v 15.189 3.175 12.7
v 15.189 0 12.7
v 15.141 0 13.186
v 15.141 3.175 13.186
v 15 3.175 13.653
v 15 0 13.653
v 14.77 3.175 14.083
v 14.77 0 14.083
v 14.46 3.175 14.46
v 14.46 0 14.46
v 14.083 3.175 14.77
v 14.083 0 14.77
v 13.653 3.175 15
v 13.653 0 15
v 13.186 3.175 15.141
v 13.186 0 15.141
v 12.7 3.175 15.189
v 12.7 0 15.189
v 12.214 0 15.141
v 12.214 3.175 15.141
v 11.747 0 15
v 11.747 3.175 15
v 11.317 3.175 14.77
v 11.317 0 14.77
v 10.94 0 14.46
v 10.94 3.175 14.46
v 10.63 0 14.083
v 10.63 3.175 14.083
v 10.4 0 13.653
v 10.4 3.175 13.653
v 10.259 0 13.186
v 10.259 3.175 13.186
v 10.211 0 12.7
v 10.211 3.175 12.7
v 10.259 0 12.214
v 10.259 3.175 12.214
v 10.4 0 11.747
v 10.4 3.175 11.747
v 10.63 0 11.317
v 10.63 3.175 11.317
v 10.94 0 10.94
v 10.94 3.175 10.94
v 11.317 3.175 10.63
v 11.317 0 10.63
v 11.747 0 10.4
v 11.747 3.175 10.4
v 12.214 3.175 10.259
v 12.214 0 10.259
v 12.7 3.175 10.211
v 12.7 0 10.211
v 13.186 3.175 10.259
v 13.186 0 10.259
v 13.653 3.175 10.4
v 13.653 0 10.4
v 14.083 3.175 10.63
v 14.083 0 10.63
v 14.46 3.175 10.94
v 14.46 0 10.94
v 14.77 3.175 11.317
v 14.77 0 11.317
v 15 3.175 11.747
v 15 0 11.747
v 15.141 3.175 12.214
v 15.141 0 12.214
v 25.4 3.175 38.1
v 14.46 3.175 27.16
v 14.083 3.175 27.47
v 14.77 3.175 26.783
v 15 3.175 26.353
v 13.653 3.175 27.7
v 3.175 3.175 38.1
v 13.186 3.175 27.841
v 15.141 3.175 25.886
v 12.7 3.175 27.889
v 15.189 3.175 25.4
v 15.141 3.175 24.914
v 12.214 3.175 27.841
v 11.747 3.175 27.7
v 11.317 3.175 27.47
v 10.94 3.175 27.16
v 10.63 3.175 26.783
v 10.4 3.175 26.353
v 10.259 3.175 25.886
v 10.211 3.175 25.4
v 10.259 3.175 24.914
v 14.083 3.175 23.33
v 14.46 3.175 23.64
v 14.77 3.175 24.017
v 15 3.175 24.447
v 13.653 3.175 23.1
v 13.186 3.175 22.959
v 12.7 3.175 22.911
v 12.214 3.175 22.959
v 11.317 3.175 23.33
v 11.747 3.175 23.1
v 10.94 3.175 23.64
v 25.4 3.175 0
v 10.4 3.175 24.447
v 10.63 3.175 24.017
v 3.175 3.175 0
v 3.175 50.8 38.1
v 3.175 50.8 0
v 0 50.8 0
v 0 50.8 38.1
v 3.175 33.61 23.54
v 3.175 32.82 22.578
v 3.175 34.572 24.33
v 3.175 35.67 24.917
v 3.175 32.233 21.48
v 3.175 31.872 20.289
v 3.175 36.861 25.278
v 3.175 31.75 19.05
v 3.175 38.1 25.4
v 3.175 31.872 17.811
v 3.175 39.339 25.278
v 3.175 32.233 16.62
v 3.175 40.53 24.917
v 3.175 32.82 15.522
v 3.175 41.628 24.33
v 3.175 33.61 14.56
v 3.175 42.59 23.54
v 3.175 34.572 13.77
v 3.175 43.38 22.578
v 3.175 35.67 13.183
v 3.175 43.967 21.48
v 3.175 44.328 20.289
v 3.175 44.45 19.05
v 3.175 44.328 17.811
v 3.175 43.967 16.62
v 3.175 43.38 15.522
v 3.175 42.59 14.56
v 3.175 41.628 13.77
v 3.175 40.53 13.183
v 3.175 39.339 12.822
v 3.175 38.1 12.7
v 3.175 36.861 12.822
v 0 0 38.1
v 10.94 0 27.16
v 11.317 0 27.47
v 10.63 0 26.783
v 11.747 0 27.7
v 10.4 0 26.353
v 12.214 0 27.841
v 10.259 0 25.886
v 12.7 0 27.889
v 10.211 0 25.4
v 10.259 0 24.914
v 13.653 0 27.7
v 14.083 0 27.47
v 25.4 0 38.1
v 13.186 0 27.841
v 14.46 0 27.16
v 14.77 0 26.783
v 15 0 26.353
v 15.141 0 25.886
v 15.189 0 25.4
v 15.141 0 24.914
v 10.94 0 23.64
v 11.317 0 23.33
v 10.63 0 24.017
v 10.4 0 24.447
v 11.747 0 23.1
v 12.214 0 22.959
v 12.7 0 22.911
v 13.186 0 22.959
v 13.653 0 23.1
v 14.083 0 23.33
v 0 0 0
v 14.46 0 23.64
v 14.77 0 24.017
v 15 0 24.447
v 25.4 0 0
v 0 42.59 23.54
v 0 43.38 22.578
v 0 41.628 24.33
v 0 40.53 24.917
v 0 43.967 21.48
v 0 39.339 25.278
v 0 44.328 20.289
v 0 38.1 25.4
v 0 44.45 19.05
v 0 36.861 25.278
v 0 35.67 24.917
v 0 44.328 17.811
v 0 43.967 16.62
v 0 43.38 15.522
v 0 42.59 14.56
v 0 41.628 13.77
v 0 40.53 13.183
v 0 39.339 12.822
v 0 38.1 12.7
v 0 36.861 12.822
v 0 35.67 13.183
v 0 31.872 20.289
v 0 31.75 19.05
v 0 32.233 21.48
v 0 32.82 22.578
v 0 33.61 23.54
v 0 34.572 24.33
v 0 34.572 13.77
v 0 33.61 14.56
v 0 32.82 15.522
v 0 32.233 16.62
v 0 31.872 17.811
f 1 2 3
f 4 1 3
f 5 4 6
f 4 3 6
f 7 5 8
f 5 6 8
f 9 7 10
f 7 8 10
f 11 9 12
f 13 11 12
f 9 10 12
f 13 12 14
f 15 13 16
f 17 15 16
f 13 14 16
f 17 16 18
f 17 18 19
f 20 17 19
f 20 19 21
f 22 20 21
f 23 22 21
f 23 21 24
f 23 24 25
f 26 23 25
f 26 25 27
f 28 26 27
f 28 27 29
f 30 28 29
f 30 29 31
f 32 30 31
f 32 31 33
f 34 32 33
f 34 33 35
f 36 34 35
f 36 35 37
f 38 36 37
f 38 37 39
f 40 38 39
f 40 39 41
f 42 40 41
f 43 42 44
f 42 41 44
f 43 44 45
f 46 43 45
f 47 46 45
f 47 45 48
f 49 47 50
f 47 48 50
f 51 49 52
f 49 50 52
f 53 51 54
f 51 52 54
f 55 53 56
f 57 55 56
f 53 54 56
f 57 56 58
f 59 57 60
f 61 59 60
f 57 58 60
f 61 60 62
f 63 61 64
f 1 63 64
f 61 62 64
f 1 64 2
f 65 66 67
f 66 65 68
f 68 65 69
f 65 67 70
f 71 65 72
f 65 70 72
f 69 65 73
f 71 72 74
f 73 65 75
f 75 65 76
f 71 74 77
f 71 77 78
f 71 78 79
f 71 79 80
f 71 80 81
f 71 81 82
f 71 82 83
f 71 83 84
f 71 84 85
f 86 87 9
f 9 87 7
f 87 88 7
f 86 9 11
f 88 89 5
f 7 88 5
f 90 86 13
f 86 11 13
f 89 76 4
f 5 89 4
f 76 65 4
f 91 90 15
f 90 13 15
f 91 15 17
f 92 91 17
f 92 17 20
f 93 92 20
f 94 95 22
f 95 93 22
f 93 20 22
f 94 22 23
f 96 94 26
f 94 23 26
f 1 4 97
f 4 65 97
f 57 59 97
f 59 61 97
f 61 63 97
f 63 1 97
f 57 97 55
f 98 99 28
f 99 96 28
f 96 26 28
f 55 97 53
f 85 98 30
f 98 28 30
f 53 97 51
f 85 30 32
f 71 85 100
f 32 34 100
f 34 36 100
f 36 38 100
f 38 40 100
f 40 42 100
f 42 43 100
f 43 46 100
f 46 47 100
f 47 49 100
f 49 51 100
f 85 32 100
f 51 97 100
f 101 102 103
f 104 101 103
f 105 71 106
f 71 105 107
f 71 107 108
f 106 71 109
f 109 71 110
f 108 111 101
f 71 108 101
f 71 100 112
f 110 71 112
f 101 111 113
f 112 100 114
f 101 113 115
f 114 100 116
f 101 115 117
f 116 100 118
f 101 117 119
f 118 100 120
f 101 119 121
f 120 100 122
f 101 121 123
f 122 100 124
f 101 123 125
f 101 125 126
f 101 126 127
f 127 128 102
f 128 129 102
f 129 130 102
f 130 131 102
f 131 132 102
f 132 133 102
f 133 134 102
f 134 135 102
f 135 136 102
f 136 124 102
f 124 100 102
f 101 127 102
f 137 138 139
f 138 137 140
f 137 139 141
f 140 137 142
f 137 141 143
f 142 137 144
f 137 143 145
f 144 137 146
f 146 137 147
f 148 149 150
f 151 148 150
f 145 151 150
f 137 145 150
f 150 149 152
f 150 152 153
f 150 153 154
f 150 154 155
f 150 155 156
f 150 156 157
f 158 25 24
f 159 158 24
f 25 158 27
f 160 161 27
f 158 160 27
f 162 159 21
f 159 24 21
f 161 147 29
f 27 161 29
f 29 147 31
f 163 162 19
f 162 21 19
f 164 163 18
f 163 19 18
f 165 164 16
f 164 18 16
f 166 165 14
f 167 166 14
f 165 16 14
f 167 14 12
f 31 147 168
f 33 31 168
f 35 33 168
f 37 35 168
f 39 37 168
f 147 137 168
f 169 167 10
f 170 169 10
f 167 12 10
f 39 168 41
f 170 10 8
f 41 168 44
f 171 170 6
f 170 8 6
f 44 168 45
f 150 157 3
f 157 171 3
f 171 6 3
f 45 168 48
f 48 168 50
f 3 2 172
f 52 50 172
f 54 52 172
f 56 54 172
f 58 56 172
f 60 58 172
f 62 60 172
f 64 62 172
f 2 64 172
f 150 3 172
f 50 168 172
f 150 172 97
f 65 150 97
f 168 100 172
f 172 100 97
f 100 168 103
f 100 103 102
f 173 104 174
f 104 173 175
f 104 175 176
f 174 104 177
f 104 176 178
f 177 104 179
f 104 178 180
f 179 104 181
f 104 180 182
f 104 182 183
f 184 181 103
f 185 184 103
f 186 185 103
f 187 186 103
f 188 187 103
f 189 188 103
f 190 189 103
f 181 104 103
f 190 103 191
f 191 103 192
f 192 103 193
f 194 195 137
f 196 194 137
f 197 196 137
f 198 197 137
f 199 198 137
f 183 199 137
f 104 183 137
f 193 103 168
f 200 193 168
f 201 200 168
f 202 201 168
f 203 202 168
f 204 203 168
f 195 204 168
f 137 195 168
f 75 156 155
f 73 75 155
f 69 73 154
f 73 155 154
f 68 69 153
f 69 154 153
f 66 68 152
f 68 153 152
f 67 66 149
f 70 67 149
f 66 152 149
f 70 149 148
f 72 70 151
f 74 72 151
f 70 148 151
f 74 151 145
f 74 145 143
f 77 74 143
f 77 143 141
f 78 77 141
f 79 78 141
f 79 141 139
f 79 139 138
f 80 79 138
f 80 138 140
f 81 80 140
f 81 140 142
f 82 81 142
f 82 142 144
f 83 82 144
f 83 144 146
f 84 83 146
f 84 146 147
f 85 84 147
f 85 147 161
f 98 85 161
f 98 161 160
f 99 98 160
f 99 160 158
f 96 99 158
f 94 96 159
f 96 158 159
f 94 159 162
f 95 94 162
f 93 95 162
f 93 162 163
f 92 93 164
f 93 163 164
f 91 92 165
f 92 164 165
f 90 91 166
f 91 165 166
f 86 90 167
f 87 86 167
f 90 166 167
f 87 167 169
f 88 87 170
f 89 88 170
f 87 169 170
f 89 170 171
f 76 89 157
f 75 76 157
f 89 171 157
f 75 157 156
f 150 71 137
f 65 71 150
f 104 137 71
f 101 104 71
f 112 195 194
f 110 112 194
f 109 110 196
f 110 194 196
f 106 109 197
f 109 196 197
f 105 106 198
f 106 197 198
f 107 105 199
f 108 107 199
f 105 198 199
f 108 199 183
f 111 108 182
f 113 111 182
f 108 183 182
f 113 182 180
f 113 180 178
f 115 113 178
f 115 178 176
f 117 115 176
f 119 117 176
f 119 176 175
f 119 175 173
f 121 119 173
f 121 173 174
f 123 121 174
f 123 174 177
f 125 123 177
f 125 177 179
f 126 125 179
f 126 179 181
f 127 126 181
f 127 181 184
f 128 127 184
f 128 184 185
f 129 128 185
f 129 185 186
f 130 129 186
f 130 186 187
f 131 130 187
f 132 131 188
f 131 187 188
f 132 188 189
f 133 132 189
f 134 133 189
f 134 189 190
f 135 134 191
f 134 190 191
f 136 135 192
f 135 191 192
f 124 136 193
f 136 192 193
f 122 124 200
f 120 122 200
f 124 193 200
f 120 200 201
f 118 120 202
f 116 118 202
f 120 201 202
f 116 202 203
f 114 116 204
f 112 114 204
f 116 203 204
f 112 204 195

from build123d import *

# Parameters (mm, degrees)
F1_DEPTH = 38.1
F2_R     = 2.4892
F3_DEPTH = 50.801
F4_R     = 6.35
F5_DEPTH = 25.401


with BuildPart() as f1:
    # F0 (on Top) → F1 (new body)
    with BuildSketch(Plane.XY):
        Polygon((3.175, 50.8), (0, 50.8), (0, 0), (25.4, 0), (25.4, 3.175), (3.175, 3.175), align=None)
    extrude(amount=F1_DEPTH)

    # F2 (on face) → F3 (cut, through all)
    with BuildSketch(Plane.XZ):
        with Locations((12.7, 25.4)):
            Circle(F2_R)
        with Locations((12.7, 12.7)):
            Circle(F2_R)
    extrude(amount=-F3_DEPTH, mode=Mode.SUBTRACT)

    # F4 (on face) → F5 (cut, through all)
    with BuildSketch(Plane(origin=(0, 0, 0), x_dir=(0, -1, 0), z_dir=(-1, 0, 0))):
        with Locations((-38.1, 19.05)):
            Circle(F4_R)
    extrude(amount=-F5_DEPTH, mode=Mode.SUBTRACT)


solid = f1.part
